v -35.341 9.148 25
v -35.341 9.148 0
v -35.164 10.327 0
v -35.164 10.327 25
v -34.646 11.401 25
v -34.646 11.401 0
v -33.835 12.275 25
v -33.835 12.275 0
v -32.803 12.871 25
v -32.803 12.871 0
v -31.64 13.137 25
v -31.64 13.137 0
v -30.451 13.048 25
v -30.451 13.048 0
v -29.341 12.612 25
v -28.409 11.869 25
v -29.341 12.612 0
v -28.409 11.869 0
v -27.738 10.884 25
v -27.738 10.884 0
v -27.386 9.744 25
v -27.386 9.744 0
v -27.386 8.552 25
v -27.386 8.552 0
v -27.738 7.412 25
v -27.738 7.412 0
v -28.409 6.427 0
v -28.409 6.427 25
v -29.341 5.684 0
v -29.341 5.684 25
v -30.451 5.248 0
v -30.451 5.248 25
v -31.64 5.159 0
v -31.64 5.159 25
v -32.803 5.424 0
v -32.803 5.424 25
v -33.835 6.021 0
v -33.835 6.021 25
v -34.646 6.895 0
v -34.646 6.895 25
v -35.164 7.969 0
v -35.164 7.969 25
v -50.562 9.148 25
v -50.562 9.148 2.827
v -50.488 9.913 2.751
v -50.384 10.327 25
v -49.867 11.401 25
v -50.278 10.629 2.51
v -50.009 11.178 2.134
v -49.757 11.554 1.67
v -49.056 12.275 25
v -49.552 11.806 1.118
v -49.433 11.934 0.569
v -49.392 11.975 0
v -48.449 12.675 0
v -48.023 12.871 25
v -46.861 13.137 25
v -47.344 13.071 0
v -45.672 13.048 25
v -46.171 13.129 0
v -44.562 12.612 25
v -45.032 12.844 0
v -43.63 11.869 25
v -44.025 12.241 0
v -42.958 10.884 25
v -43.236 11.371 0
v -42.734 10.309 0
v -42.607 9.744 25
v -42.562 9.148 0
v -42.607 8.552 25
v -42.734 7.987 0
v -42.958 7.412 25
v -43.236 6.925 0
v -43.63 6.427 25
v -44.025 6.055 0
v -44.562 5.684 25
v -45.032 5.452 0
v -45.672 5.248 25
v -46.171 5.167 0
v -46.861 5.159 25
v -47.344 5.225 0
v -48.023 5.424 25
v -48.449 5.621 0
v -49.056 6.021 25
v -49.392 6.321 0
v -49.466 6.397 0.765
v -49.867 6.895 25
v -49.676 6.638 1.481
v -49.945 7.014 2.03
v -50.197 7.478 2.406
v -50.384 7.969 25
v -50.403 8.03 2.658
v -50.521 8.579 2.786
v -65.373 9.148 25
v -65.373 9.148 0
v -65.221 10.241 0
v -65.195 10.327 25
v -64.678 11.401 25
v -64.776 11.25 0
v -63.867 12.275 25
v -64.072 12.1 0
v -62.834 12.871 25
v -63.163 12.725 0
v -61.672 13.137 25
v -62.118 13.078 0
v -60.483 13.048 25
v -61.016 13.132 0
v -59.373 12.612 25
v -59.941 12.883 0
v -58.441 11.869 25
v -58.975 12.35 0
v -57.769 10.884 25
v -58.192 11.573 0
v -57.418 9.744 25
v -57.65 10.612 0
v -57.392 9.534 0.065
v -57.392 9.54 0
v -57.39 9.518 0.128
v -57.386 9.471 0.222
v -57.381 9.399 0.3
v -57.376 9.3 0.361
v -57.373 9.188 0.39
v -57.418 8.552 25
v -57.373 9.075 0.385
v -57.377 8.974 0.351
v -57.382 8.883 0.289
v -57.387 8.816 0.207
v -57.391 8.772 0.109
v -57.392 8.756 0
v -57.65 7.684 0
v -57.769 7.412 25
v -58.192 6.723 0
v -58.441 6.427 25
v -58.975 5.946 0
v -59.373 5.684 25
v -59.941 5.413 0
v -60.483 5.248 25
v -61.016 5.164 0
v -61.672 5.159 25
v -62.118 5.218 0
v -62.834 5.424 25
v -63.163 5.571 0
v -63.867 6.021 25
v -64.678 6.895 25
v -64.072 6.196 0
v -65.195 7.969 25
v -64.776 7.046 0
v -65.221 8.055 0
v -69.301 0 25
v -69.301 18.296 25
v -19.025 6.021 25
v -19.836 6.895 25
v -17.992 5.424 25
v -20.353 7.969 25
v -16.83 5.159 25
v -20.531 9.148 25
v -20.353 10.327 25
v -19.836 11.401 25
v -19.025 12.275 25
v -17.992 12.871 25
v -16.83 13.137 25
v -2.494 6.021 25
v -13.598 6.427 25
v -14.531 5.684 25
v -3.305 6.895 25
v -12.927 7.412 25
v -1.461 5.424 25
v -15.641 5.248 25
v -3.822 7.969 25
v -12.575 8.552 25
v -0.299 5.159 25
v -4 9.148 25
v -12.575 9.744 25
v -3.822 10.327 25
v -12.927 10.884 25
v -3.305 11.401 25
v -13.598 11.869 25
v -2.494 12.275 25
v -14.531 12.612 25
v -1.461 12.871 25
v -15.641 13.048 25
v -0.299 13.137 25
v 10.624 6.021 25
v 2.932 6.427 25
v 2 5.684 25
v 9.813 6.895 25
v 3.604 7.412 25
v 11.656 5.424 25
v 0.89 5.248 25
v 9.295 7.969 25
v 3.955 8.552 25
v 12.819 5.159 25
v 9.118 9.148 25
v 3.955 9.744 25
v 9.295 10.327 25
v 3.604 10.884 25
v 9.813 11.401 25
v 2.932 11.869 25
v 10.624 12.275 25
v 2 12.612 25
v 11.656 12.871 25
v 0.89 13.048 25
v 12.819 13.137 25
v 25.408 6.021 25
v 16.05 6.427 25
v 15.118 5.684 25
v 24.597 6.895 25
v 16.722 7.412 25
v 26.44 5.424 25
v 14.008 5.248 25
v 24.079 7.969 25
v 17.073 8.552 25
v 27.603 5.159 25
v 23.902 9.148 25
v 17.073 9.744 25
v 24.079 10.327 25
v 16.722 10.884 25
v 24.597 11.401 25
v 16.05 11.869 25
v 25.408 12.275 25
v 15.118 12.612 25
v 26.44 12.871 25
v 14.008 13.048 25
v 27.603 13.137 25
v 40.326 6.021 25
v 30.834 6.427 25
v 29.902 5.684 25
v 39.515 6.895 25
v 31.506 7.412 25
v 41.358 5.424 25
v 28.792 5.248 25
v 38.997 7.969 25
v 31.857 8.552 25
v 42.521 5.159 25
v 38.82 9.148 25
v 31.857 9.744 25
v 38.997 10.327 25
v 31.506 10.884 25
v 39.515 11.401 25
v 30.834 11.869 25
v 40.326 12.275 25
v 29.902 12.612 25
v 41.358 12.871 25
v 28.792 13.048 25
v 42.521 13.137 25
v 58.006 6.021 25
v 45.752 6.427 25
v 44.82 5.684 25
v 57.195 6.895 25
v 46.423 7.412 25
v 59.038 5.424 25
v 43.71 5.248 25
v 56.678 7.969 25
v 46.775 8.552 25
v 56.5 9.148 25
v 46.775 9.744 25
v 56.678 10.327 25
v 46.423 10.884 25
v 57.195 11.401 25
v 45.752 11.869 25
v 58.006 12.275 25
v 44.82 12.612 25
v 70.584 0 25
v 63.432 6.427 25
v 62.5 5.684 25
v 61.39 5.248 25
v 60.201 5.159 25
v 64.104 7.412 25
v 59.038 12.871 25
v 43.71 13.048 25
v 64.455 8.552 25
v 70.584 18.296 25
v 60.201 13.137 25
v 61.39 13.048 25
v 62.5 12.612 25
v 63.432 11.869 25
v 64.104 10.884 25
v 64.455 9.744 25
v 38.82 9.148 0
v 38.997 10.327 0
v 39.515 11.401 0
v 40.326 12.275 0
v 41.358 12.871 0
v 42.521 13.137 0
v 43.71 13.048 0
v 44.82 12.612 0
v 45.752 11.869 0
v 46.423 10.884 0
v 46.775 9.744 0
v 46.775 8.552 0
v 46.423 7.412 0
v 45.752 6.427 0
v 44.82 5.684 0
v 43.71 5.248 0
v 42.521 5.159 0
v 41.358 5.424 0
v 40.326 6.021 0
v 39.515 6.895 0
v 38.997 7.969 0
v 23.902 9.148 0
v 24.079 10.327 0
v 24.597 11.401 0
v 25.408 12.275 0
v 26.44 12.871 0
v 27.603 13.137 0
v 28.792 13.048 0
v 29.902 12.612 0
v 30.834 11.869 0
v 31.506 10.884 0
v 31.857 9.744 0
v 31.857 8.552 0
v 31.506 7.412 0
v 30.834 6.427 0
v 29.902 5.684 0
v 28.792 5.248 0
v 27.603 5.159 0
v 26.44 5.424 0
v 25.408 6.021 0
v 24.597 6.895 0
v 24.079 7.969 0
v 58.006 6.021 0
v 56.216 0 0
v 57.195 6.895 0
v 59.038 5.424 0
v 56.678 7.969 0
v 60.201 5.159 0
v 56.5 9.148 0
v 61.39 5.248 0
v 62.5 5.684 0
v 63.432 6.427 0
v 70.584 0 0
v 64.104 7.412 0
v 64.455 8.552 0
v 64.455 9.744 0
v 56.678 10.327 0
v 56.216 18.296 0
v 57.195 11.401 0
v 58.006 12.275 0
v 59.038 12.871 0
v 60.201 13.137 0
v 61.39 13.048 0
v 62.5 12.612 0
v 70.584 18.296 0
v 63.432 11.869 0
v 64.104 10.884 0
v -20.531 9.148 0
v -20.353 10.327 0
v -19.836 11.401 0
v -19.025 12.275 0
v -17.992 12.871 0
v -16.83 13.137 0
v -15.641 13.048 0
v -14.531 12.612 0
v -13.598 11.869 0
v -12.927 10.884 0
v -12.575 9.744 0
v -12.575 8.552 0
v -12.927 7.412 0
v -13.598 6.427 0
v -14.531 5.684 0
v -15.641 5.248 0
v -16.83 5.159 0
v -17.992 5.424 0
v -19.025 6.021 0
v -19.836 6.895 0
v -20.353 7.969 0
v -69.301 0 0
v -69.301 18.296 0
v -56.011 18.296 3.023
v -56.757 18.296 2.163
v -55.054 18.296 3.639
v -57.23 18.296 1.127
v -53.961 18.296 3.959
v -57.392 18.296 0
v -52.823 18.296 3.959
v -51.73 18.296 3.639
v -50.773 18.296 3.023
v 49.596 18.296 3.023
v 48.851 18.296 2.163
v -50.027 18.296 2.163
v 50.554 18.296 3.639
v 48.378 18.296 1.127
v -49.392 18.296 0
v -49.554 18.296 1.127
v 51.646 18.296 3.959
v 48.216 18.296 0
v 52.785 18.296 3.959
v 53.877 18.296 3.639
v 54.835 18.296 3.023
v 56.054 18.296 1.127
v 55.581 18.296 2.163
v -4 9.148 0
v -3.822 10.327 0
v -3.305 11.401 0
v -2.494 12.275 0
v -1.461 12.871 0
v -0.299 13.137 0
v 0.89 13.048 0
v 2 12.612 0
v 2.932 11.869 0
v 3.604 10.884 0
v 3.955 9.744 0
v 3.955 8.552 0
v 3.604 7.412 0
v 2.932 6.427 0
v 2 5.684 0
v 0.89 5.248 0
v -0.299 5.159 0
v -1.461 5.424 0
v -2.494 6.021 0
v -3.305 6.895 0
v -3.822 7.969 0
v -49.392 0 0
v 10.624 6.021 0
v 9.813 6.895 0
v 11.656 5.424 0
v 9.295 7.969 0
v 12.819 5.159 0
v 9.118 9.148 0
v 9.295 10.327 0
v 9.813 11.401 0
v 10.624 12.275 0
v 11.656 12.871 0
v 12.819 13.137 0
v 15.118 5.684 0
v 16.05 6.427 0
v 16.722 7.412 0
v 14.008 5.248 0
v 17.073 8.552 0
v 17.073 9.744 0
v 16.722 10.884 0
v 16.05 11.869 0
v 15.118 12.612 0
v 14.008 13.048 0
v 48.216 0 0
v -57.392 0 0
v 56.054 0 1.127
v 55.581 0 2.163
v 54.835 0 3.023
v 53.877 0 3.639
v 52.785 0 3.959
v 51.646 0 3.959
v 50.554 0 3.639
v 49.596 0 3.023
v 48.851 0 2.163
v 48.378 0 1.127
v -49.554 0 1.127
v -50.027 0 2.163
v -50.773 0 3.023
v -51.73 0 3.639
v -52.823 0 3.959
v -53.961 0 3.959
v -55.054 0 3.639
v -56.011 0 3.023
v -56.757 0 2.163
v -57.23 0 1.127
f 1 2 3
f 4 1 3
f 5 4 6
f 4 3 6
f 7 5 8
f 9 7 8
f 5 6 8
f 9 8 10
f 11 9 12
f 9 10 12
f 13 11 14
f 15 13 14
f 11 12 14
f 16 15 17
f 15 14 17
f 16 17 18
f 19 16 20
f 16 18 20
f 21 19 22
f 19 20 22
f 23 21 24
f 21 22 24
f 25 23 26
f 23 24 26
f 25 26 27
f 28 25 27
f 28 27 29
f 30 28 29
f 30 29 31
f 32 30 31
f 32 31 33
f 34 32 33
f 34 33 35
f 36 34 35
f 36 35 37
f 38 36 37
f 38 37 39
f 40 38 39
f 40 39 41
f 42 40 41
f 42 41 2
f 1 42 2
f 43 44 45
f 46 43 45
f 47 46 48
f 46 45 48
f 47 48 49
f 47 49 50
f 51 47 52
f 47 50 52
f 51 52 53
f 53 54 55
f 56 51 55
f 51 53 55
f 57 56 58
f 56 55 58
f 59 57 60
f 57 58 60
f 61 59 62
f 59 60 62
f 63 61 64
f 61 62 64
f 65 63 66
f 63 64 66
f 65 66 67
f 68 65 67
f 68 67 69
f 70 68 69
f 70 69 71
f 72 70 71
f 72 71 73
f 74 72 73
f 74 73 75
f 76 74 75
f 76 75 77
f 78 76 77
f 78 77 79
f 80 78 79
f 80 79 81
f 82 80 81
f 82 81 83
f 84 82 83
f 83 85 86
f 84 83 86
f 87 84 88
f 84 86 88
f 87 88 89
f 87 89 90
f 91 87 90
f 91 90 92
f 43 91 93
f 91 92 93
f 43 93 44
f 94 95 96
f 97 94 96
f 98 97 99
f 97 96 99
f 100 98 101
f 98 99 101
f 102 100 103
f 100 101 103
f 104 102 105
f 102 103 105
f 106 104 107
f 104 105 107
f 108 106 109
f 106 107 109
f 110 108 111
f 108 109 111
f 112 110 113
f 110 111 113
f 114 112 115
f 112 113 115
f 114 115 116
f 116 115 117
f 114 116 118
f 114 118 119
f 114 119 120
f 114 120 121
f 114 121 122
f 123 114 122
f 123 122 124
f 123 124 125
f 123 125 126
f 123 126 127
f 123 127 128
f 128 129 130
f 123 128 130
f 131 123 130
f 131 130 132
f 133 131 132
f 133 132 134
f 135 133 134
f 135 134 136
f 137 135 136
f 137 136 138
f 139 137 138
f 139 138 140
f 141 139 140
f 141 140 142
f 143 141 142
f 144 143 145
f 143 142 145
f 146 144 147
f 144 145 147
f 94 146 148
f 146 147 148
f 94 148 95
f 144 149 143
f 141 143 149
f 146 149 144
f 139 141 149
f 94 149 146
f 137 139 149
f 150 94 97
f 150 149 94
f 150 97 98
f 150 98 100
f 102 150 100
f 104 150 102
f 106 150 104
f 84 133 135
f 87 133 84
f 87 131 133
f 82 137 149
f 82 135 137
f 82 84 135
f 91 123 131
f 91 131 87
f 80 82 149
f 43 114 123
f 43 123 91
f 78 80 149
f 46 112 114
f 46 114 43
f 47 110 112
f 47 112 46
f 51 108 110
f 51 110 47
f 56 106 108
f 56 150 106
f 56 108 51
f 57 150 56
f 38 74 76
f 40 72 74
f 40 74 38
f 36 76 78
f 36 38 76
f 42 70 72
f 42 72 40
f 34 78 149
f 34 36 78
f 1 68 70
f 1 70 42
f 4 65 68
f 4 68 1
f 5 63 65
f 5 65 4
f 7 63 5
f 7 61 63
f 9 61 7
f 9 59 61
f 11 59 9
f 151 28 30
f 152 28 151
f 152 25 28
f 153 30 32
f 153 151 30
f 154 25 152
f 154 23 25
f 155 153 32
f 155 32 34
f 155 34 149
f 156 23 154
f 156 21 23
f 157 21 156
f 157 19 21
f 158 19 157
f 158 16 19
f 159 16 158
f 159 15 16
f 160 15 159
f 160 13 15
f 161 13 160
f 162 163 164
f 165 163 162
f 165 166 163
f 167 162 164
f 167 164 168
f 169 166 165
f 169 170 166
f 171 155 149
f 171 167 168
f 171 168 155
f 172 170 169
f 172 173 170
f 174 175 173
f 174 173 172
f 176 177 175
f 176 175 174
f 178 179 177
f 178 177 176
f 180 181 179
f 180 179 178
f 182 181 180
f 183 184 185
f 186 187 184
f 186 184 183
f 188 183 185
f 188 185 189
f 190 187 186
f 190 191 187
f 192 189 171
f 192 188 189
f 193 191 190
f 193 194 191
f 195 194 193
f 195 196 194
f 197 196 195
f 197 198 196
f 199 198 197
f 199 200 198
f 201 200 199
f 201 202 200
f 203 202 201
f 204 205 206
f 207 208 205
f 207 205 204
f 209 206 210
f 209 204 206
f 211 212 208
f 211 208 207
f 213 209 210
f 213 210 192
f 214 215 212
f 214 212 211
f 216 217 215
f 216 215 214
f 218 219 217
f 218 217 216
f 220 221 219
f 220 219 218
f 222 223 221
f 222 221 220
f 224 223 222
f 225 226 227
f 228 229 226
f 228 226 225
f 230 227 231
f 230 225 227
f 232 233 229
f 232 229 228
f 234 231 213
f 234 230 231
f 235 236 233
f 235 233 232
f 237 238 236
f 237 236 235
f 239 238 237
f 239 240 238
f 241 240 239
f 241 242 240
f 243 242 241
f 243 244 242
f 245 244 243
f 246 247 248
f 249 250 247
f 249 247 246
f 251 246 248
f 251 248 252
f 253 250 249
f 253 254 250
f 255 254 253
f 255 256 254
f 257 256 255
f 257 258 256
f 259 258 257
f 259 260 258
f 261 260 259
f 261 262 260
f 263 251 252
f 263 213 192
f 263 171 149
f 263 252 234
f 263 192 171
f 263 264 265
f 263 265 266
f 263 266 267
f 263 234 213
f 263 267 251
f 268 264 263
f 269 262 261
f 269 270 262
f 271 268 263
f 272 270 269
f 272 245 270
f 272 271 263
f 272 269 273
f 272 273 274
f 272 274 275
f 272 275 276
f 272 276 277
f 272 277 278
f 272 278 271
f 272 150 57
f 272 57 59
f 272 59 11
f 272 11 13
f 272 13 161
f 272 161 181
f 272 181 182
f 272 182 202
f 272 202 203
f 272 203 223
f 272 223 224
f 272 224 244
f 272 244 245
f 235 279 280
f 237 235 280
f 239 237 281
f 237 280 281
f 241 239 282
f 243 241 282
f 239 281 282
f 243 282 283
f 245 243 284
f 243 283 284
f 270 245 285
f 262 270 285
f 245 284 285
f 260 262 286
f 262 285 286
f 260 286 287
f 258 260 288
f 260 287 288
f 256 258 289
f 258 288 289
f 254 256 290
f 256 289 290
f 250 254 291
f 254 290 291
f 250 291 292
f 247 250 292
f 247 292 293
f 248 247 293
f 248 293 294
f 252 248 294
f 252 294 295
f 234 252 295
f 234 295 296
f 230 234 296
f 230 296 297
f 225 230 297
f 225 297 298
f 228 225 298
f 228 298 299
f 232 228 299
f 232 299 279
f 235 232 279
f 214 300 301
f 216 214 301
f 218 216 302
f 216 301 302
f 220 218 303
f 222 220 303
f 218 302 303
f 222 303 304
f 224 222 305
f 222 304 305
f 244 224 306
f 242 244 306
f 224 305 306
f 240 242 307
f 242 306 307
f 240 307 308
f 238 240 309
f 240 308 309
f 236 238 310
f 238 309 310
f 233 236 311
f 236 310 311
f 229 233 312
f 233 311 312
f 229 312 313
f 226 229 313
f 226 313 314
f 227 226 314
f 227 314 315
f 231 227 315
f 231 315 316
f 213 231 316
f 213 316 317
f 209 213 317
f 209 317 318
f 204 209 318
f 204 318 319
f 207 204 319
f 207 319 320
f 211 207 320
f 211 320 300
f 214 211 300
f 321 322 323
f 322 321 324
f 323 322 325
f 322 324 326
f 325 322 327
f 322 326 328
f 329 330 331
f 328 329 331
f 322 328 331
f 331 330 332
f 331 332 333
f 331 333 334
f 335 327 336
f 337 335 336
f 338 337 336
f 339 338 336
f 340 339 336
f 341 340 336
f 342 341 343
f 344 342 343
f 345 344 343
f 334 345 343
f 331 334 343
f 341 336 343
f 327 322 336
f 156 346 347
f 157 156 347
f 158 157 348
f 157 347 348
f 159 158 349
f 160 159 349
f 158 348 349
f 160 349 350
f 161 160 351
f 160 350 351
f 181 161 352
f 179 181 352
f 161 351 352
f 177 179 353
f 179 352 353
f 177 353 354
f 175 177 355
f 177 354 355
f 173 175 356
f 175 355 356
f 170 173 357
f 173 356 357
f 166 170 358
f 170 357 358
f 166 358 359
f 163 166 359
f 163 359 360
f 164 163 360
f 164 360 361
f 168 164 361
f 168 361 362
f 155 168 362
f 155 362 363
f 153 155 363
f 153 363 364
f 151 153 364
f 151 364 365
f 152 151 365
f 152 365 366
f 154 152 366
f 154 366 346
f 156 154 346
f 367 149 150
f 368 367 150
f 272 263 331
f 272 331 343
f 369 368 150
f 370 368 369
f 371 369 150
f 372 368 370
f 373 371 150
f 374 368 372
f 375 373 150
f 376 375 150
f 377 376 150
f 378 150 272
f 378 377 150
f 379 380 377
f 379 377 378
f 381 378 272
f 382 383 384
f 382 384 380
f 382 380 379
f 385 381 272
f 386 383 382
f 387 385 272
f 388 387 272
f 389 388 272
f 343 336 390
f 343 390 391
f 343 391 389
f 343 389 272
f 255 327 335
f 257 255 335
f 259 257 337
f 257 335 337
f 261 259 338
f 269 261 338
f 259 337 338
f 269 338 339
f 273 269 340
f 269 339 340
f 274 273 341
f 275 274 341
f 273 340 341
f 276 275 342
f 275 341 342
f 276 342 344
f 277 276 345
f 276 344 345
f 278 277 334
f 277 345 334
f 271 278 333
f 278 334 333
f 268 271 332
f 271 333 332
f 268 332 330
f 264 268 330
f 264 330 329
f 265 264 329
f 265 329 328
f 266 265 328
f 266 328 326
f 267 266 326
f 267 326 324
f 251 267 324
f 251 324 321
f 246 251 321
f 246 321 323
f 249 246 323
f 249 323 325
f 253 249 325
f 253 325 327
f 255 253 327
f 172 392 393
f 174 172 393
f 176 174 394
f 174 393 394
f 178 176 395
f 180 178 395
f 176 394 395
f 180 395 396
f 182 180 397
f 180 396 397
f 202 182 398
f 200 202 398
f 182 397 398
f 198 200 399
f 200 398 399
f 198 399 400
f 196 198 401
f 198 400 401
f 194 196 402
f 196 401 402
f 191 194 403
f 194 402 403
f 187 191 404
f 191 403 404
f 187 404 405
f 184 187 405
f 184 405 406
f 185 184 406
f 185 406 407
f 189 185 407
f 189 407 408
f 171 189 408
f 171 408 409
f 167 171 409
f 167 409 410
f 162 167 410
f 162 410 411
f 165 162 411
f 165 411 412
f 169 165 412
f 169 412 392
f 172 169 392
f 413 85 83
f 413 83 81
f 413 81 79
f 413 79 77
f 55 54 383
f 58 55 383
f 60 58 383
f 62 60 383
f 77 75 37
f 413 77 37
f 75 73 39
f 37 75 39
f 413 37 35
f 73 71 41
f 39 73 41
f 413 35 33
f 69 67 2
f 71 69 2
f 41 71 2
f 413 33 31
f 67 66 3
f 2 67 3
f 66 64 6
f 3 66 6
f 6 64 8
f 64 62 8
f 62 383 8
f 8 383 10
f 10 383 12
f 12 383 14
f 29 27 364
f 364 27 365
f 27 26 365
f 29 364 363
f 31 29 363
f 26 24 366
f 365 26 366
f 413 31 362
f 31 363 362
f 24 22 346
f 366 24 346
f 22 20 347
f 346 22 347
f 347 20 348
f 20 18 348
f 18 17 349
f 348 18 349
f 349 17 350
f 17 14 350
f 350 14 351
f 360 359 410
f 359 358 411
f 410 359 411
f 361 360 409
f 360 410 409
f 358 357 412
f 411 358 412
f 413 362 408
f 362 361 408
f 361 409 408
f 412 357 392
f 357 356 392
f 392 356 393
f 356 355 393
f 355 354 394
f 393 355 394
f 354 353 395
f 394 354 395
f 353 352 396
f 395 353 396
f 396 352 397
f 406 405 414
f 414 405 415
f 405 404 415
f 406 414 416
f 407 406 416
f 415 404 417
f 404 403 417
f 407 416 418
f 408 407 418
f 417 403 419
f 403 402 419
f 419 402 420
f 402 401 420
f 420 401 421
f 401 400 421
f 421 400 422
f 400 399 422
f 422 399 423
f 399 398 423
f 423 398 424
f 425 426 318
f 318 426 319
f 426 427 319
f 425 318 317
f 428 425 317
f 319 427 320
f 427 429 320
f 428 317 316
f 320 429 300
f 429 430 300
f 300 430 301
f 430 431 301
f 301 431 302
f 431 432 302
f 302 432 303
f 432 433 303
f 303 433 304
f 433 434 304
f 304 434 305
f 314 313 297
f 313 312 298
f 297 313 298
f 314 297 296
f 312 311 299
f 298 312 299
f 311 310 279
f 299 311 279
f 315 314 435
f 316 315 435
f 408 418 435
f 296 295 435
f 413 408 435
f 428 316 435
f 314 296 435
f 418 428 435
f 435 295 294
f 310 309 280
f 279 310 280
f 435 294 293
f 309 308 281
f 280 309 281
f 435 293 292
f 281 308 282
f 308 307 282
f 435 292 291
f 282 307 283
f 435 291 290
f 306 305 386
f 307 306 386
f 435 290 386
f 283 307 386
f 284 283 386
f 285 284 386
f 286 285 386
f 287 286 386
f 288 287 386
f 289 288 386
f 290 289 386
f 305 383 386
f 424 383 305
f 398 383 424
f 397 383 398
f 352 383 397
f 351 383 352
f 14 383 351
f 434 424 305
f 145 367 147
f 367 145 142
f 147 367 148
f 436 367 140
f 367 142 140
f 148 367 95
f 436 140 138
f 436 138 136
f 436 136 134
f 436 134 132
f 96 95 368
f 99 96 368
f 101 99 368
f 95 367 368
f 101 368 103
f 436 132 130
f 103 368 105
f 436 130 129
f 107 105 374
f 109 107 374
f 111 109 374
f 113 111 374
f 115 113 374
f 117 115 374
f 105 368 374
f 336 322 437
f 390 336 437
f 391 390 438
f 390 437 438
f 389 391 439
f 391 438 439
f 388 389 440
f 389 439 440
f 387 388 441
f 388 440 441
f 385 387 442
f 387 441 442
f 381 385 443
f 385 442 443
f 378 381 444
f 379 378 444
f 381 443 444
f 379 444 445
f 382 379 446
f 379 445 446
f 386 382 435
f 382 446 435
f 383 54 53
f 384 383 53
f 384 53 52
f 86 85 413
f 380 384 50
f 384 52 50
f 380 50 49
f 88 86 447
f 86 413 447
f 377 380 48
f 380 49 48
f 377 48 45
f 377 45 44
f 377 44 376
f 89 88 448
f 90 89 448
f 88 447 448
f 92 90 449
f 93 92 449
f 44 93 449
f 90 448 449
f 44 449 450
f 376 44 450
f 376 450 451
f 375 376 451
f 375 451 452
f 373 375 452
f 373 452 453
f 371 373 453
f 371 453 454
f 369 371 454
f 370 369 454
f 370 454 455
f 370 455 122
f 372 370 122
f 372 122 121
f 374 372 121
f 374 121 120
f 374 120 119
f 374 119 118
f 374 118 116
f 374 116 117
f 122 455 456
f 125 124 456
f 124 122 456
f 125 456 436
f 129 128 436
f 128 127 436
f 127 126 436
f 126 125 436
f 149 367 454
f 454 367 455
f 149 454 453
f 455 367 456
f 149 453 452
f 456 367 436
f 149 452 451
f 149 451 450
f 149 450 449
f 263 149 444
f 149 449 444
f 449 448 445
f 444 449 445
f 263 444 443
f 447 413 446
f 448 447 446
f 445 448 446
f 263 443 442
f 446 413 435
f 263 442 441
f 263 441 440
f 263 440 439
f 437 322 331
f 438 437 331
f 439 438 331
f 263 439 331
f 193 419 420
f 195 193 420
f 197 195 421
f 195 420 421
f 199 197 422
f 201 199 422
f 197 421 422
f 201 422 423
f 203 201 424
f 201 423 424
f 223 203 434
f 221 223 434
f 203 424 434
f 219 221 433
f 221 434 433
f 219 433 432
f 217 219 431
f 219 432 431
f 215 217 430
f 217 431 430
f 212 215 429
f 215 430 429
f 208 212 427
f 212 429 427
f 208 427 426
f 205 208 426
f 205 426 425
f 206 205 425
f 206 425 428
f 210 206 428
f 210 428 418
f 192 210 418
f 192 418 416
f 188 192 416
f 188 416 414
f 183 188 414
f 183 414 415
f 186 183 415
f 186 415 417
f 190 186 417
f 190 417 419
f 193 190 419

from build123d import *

# Parameters (mm, degrees)
F0_W     = 139.885172
F0_H     = 18.295985
F1_DEPTH = 25
F3_D     = 8
F5_D     = 8


with BuildPart() as f1:
    # F0 (on Top) → F1 (new body)
    with BuildSketch(Plane.XY):
        with Locations((0.641361, 9.147992)):
            Rectangle(F0_W, F0_H)
    extrude(amount=F1_DEPTH)

    # F3 (through all)
    with Locations(Plane.XY.offset(25)):
        with Locations((-61.372835, 9.147992), (-46.562072, 9.147992), (-31.341393, 9.147992), (-16.530629, 9.147992), (0, 9.147992), (13.117687, 9.147992), (27.901655, 9.147992), (42.819589, 9.147992), (60.49981, 9.147992)):
            Hole(F3_D / 2)

    # F5 (through all)
    with Locations(Plane(origin=(0, 18.295985, 0), x_dir=(-1, 0, 0), z_dir=(0, 1, 0))):
        with Locations((-52.215707, 0), (53.392045, 0)):
            Hole(F5_D / 2)


solid = f1.part
